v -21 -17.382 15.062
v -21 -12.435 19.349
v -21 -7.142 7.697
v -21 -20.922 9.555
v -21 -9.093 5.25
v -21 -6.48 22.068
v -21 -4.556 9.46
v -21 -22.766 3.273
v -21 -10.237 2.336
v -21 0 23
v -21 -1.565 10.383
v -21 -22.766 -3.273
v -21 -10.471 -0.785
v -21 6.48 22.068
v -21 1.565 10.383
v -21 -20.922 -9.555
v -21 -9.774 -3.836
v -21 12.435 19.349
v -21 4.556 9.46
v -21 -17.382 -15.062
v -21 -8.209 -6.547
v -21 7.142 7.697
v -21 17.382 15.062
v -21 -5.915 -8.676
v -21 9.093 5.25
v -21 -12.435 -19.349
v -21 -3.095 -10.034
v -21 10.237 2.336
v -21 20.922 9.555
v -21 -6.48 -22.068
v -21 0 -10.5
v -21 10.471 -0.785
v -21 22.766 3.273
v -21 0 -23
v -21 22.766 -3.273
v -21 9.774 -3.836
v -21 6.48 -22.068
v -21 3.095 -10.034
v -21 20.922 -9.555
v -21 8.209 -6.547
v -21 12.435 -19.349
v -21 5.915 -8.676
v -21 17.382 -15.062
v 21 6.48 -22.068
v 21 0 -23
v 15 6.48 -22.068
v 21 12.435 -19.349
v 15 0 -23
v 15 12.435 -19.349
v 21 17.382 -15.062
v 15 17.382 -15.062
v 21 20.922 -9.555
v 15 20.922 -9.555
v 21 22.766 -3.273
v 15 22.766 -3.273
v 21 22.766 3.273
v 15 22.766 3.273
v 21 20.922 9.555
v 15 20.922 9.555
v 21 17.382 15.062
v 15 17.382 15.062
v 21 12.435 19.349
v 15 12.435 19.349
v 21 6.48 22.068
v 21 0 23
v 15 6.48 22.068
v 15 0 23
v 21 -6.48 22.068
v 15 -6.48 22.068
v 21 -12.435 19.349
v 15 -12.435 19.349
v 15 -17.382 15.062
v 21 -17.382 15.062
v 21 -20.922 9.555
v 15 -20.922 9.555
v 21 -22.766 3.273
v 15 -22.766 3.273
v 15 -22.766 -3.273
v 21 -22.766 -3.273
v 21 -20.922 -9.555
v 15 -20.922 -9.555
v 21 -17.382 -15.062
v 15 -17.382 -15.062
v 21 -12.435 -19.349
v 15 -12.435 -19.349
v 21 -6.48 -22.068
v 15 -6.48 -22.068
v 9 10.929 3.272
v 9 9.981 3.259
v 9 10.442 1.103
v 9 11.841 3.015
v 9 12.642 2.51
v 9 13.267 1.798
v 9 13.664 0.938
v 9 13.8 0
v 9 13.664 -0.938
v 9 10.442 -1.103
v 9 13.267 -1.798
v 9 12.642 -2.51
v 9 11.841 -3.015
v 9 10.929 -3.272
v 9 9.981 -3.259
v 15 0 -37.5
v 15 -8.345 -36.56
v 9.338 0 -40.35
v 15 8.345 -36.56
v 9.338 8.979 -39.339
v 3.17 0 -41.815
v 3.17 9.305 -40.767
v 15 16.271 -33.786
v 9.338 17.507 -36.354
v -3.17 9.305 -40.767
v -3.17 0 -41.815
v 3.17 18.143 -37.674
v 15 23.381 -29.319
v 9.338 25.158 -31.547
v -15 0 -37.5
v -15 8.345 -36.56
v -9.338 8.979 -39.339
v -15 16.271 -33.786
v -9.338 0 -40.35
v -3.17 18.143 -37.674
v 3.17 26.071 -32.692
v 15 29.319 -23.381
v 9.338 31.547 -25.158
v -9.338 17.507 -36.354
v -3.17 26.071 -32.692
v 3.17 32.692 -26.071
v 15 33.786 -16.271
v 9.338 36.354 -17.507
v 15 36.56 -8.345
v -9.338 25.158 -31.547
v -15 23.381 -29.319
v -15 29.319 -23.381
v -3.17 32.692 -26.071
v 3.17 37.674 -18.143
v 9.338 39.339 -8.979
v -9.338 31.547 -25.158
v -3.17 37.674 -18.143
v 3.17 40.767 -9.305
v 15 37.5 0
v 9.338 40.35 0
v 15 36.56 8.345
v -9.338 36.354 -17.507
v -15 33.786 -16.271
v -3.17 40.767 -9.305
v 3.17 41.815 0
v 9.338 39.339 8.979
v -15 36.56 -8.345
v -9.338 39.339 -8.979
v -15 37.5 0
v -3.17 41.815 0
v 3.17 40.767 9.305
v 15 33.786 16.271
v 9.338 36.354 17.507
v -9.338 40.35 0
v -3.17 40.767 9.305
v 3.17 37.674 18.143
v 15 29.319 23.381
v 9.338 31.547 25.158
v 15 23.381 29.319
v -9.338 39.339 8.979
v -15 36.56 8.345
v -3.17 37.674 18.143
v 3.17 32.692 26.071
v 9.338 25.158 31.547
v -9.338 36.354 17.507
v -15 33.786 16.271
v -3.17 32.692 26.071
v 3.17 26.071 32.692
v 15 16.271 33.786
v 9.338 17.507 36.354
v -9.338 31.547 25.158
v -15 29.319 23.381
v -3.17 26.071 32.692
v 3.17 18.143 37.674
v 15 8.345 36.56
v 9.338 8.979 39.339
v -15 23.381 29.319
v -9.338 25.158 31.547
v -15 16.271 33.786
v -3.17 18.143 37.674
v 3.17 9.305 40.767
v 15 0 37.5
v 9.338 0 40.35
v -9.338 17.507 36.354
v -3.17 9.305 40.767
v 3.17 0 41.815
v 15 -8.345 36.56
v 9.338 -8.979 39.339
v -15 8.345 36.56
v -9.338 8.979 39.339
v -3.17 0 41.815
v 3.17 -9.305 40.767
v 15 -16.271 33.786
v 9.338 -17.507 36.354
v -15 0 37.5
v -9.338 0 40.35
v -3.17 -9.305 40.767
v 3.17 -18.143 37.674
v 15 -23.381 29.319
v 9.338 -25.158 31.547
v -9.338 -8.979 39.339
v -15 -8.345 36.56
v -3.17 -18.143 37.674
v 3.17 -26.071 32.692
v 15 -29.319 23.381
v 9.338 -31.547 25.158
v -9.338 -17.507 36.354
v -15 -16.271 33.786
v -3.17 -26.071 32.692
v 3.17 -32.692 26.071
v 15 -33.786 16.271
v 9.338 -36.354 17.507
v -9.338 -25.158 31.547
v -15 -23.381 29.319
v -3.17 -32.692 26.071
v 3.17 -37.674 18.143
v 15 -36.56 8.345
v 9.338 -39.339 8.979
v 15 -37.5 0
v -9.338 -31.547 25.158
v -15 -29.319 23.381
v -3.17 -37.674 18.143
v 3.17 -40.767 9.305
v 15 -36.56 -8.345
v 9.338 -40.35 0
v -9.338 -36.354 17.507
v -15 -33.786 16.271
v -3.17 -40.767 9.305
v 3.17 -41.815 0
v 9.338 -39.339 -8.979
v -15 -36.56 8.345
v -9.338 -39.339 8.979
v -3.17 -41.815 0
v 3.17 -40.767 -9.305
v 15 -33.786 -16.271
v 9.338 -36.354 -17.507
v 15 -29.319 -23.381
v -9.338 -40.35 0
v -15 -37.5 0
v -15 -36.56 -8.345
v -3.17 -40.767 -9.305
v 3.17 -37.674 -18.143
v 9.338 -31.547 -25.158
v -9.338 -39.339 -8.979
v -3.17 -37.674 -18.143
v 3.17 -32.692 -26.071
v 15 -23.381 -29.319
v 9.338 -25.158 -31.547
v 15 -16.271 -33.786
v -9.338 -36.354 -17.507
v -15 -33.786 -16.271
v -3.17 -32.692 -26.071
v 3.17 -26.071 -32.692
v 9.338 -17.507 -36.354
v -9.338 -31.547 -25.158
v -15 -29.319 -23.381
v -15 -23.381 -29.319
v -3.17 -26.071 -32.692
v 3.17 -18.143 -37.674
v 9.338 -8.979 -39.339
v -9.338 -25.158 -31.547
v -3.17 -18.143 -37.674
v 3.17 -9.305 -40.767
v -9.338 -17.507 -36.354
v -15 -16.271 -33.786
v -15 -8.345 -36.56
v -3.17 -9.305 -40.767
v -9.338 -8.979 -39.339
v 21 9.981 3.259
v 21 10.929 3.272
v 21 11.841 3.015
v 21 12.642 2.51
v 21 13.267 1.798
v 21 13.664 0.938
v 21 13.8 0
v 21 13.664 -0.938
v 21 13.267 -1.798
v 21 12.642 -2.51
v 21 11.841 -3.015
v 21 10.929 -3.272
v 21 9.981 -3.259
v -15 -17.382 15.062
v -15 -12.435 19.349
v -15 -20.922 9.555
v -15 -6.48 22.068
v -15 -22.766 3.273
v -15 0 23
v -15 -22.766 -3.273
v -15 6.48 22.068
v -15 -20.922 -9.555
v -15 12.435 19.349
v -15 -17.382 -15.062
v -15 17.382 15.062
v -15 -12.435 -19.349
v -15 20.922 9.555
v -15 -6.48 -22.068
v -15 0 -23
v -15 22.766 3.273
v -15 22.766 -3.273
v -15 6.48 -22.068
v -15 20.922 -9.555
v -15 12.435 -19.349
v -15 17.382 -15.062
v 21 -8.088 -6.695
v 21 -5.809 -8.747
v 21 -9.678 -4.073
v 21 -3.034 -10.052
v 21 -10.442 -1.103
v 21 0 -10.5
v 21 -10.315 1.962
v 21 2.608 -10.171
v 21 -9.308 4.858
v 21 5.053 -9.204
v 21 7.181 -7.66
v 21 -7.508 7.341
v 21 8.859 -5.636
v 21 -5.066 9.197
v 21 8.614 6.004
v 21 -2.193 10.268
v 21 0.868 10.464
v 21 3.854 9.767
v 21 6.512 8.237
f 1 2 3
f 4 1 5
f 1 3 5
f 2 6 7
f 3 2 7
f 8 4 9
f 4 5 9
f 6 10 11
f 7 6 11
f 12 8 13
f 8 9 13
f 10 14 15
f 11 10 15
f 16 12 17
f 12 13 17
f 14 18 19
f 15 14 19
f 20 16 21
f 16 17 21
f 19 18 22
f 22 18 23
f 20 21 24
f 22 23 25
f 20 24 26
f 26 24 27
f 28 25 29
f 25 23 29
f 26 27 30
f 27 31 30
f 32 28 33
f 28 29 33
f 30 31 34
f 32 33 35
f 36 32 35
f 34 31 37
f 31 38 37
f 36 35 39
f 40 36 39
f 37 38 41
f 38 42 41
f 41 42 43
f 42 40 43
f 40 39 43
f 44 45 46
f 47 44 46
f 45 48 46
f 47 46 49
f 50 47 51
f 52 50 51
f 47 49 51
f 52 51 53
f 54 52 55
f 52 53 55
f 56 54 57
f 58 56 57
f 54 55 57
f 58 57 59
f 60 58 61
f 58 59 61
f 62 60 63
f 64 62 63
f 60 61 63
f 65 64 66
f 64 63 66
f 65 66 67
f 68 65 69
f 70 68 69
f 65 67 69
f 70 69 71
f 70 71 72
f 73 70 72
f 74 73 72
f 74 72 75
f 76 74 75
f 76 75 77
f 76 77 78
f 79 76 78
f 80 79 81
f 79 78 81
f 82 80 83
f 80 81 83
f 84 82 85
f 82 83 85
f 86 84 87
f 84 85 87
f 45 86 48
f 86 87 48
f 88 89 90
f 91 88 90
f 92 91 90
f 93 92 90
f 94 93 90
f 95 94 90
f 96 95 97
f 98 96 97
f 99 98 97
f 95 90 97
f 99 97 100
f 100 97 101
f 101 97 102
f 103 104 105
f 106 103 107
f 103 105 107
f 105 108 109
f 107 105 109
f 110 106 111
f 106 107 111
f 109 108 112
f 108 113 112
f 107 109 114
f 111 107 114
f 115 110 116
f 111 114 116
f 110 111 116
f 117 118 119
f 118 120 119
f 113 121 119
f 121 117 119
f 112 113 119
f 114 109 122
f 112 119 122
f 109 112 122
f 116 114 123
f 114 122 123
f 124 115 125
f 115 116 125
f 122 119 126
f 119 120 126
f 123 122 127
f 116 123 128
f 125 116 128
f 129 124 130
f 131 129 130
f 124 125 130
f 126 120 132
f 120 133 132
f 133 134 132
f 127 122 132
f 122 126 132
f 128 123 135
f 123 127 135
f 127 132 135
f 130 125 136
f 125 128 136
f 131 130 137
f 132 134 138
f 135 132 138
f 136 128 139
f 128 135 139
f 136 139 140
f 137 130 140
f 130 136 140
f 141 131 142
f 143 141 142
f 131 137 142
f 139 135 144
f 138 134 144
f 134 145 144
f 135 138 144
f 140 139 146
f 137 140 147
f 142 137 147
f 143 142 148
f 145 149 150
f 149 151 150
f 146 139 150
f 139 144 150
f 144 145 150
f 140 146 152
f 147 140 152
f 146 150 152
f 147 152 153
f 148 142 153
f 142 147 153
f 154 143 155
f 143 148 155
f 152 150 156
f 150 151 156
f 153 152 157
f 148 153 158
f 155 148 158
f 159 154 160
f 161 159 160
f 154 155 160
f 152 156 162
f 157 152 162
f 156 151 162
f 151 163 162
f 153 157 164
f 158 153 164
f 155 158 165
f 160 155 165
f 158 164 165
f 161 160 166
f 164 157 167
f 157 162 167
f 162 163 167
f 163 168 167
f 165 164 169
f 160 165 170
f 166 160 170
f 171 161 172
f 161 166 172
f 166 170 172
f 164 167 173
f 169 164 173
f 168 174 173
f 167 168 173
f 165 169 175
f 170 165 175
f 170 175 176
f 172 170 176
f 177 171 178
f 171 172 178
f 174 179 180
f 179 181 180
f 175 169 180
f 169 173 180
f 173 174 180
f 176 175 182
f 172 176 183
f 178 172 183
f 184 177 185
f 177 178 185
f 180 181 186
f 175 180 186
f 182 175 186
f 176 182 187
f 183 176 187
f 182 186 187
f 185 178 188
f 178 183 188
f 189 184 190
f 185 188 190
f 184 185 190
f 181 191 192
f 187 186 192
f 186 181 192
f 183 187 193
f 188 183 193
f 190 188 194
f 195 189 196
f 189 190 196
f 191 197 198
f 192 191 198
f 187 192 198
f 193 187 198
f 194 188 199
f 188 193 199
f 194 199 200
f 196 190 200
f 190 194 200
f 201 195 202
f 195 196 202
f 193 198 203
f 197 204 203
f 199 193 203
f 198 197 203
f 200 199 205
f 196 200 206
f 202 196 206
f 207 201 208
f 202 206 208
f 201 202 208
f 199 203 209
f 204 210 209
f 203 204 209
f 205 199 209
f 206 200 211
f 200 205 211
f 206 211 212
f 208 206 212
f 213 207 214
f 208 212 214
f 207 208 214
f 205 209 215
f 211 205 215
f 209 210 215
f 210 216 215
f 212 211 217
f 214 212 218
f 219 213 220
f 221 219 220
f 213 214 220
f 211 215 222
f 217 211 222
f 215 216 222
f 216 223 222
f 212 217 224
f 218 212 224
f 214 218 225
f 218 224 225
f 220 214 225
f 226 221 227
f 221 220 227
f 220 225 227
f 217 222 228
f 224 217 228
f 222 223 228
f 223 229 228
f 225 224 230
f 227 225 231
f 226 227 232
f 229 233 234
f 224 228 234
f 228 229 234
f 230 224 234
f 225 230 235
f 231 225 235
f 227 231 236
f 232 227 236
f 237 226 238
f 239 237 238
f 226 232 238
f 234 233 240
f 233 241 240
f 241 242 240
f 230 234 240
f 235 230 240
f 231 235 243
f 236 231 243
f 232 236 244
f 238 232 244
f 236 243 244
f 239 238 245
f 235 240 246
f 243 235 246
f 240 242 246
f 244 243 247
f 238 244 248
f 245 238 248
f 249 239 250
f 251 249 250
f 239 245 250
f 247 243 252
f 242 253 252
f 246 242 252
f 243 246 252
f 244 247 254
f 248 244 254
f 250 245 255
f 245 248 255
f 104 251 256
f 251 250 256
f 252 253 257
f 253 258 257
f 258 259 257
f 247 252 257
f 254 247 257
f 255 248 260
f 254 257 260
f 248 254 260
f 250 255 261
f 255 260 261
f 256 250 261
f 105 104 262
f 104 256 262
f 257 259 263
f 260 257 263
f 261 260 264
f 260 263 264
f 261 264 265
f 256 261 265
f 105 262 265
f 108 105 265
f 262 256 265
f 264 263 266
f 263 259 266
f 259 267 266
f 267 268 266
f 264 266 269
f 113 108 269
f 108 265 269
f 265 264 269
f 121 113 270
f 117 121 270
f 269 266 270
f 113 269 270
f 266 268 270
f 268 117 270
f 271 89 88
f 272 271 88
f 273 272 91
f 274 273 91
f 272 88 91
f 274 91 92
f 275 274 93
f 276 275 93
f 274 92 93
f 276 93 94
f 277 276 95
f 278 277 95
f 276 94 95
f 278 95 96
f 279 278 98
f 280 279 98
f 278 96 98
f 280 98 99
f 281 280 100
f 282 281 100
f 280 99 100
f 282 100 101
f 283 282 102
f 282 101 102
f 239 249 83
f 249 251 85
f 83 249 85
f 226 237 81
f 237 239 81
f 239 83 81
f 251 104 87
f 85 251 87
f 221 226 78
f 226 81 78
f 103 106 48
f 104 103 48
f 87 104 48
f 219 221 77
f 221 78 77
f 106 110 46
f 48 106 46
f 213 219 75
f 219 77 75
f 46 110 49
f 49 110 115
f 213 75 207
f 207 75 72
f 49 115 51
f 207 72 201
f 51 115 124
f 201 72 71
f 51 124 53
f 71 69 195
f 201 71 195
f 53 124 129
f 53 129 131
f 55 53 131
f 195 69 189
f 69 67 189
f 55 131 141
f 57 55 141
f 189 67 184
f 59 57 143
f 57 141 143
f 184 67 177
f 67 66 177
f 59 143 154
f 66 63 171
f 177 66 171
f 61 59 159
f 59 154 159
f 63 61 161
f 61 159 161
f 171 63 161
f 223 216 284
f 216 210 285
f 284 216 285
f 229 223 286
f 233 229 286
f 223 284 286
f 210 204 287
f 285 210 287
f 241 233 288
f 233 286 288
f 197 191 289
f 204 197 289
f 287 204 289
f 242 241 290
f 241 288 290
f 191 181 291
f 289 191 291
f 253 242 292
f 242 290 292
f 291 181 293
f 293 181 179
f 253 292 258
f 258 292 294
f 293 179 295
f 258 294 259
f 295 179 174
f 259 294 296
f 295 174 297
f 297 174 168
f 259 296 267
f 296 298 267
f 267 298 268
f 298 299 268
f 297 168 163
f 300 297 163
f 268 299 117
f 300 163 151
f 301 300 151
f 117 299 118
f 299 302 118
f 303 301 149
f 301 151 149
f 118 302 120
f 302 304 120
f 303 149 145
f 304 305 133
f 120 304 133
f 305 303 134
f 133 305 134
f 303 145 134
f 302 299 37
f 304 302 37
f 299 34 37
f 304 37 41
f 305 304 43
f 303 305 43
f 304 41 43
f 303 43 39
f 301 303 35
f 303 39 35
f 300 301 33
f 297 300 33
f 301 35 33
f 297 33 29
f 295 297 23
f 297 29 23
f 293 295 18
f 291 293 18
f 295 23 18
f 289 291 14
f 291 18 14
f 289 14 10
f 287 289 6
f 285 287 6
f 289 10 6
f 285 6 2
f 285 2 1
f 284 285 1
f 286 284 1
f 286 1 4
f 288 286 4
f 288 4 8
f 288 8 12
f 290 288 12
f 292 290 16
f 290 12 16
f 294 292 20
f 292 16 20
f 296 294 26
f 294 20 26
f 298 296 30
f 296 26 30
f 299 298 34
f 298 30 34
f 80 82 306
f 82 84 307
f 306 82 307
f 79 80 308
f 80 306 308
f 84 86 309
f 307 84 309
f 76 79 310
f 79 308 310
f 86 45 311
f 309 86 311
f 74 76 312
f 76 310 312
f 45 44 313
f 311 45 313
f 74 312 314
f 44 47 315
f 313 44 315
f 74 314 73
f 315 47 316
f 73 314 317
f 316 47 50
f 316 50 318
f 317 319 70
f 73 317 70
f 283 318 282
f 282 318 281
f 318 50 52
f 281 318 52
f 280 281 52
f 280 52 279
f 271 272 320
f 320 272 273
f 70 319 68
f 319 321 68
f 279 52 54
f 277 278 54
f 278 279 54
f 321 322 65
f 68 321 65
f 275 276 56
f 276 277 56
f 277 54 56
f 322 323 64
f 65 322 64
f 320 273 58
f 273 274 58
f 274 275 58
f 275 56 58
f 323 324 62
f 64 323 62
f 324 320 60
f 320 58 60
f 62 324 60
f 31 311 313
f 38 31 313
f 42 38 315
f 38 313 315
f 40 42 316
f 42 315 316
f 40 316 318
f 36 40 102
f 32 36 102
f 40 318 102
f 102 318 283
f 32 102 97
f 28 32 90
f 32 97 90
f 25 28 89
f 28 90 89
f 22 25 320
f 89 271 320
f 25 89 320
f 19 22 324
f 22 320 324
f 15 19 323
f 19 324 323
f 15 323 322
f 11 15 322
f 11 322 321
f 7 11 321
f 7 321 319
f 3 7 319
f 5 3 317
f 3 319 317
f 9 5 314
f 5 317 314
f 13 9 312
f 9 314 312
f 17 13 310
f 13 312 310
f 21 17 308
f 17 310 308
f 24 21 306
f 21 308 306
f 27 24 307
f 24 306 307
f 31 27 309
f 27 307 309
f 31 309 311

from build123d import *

# Parameters (mm, degrees)
M6_CLEARANCE_HOLE1_D     = 6.6
M6_CLEARANCE_HOLE1_DEPTH = 12


with BuildPart() as part:
    # Sketch1 → Revolve1 (revolve)
    with BuildSketch(Plane(origin=(0, 0, 0), x_dir=(1, 0, 0), z_dir=(0, 1, 0))):
        with BuildLine():
            Line((-21, 10.5), (21, 10.5))
            Line((21, 10.5), (21, 23))
            Line((21, 23), (15, 23))
            Line((15, 23), (15, 37.5))
            ThreePointArc((15, 37.5), (0, 42), (-15, 37.5))
            Line((-15, 37.5), (-15, 23))
            Line((-15, 23), (-21, 23))
            Line((-21, 23), (-21, 10.5))
        make_face()
    revolve(axis=Axis((-68.247922762, 0, 0), (1, 0, 0)))

    # M6 Clearance Hole1
    with Locations(Plane(origin=(21, 10.5, 0), x_dir=(0, 0, 1), z_dir=(1, 0, 0))):
        with Locations((0, 0)):
            Hole(M6_CLEARANCE_HOLE1_D / 2, depth=M6_CLEARANCE_HOLE1_DEPTH)


solid = part.part
